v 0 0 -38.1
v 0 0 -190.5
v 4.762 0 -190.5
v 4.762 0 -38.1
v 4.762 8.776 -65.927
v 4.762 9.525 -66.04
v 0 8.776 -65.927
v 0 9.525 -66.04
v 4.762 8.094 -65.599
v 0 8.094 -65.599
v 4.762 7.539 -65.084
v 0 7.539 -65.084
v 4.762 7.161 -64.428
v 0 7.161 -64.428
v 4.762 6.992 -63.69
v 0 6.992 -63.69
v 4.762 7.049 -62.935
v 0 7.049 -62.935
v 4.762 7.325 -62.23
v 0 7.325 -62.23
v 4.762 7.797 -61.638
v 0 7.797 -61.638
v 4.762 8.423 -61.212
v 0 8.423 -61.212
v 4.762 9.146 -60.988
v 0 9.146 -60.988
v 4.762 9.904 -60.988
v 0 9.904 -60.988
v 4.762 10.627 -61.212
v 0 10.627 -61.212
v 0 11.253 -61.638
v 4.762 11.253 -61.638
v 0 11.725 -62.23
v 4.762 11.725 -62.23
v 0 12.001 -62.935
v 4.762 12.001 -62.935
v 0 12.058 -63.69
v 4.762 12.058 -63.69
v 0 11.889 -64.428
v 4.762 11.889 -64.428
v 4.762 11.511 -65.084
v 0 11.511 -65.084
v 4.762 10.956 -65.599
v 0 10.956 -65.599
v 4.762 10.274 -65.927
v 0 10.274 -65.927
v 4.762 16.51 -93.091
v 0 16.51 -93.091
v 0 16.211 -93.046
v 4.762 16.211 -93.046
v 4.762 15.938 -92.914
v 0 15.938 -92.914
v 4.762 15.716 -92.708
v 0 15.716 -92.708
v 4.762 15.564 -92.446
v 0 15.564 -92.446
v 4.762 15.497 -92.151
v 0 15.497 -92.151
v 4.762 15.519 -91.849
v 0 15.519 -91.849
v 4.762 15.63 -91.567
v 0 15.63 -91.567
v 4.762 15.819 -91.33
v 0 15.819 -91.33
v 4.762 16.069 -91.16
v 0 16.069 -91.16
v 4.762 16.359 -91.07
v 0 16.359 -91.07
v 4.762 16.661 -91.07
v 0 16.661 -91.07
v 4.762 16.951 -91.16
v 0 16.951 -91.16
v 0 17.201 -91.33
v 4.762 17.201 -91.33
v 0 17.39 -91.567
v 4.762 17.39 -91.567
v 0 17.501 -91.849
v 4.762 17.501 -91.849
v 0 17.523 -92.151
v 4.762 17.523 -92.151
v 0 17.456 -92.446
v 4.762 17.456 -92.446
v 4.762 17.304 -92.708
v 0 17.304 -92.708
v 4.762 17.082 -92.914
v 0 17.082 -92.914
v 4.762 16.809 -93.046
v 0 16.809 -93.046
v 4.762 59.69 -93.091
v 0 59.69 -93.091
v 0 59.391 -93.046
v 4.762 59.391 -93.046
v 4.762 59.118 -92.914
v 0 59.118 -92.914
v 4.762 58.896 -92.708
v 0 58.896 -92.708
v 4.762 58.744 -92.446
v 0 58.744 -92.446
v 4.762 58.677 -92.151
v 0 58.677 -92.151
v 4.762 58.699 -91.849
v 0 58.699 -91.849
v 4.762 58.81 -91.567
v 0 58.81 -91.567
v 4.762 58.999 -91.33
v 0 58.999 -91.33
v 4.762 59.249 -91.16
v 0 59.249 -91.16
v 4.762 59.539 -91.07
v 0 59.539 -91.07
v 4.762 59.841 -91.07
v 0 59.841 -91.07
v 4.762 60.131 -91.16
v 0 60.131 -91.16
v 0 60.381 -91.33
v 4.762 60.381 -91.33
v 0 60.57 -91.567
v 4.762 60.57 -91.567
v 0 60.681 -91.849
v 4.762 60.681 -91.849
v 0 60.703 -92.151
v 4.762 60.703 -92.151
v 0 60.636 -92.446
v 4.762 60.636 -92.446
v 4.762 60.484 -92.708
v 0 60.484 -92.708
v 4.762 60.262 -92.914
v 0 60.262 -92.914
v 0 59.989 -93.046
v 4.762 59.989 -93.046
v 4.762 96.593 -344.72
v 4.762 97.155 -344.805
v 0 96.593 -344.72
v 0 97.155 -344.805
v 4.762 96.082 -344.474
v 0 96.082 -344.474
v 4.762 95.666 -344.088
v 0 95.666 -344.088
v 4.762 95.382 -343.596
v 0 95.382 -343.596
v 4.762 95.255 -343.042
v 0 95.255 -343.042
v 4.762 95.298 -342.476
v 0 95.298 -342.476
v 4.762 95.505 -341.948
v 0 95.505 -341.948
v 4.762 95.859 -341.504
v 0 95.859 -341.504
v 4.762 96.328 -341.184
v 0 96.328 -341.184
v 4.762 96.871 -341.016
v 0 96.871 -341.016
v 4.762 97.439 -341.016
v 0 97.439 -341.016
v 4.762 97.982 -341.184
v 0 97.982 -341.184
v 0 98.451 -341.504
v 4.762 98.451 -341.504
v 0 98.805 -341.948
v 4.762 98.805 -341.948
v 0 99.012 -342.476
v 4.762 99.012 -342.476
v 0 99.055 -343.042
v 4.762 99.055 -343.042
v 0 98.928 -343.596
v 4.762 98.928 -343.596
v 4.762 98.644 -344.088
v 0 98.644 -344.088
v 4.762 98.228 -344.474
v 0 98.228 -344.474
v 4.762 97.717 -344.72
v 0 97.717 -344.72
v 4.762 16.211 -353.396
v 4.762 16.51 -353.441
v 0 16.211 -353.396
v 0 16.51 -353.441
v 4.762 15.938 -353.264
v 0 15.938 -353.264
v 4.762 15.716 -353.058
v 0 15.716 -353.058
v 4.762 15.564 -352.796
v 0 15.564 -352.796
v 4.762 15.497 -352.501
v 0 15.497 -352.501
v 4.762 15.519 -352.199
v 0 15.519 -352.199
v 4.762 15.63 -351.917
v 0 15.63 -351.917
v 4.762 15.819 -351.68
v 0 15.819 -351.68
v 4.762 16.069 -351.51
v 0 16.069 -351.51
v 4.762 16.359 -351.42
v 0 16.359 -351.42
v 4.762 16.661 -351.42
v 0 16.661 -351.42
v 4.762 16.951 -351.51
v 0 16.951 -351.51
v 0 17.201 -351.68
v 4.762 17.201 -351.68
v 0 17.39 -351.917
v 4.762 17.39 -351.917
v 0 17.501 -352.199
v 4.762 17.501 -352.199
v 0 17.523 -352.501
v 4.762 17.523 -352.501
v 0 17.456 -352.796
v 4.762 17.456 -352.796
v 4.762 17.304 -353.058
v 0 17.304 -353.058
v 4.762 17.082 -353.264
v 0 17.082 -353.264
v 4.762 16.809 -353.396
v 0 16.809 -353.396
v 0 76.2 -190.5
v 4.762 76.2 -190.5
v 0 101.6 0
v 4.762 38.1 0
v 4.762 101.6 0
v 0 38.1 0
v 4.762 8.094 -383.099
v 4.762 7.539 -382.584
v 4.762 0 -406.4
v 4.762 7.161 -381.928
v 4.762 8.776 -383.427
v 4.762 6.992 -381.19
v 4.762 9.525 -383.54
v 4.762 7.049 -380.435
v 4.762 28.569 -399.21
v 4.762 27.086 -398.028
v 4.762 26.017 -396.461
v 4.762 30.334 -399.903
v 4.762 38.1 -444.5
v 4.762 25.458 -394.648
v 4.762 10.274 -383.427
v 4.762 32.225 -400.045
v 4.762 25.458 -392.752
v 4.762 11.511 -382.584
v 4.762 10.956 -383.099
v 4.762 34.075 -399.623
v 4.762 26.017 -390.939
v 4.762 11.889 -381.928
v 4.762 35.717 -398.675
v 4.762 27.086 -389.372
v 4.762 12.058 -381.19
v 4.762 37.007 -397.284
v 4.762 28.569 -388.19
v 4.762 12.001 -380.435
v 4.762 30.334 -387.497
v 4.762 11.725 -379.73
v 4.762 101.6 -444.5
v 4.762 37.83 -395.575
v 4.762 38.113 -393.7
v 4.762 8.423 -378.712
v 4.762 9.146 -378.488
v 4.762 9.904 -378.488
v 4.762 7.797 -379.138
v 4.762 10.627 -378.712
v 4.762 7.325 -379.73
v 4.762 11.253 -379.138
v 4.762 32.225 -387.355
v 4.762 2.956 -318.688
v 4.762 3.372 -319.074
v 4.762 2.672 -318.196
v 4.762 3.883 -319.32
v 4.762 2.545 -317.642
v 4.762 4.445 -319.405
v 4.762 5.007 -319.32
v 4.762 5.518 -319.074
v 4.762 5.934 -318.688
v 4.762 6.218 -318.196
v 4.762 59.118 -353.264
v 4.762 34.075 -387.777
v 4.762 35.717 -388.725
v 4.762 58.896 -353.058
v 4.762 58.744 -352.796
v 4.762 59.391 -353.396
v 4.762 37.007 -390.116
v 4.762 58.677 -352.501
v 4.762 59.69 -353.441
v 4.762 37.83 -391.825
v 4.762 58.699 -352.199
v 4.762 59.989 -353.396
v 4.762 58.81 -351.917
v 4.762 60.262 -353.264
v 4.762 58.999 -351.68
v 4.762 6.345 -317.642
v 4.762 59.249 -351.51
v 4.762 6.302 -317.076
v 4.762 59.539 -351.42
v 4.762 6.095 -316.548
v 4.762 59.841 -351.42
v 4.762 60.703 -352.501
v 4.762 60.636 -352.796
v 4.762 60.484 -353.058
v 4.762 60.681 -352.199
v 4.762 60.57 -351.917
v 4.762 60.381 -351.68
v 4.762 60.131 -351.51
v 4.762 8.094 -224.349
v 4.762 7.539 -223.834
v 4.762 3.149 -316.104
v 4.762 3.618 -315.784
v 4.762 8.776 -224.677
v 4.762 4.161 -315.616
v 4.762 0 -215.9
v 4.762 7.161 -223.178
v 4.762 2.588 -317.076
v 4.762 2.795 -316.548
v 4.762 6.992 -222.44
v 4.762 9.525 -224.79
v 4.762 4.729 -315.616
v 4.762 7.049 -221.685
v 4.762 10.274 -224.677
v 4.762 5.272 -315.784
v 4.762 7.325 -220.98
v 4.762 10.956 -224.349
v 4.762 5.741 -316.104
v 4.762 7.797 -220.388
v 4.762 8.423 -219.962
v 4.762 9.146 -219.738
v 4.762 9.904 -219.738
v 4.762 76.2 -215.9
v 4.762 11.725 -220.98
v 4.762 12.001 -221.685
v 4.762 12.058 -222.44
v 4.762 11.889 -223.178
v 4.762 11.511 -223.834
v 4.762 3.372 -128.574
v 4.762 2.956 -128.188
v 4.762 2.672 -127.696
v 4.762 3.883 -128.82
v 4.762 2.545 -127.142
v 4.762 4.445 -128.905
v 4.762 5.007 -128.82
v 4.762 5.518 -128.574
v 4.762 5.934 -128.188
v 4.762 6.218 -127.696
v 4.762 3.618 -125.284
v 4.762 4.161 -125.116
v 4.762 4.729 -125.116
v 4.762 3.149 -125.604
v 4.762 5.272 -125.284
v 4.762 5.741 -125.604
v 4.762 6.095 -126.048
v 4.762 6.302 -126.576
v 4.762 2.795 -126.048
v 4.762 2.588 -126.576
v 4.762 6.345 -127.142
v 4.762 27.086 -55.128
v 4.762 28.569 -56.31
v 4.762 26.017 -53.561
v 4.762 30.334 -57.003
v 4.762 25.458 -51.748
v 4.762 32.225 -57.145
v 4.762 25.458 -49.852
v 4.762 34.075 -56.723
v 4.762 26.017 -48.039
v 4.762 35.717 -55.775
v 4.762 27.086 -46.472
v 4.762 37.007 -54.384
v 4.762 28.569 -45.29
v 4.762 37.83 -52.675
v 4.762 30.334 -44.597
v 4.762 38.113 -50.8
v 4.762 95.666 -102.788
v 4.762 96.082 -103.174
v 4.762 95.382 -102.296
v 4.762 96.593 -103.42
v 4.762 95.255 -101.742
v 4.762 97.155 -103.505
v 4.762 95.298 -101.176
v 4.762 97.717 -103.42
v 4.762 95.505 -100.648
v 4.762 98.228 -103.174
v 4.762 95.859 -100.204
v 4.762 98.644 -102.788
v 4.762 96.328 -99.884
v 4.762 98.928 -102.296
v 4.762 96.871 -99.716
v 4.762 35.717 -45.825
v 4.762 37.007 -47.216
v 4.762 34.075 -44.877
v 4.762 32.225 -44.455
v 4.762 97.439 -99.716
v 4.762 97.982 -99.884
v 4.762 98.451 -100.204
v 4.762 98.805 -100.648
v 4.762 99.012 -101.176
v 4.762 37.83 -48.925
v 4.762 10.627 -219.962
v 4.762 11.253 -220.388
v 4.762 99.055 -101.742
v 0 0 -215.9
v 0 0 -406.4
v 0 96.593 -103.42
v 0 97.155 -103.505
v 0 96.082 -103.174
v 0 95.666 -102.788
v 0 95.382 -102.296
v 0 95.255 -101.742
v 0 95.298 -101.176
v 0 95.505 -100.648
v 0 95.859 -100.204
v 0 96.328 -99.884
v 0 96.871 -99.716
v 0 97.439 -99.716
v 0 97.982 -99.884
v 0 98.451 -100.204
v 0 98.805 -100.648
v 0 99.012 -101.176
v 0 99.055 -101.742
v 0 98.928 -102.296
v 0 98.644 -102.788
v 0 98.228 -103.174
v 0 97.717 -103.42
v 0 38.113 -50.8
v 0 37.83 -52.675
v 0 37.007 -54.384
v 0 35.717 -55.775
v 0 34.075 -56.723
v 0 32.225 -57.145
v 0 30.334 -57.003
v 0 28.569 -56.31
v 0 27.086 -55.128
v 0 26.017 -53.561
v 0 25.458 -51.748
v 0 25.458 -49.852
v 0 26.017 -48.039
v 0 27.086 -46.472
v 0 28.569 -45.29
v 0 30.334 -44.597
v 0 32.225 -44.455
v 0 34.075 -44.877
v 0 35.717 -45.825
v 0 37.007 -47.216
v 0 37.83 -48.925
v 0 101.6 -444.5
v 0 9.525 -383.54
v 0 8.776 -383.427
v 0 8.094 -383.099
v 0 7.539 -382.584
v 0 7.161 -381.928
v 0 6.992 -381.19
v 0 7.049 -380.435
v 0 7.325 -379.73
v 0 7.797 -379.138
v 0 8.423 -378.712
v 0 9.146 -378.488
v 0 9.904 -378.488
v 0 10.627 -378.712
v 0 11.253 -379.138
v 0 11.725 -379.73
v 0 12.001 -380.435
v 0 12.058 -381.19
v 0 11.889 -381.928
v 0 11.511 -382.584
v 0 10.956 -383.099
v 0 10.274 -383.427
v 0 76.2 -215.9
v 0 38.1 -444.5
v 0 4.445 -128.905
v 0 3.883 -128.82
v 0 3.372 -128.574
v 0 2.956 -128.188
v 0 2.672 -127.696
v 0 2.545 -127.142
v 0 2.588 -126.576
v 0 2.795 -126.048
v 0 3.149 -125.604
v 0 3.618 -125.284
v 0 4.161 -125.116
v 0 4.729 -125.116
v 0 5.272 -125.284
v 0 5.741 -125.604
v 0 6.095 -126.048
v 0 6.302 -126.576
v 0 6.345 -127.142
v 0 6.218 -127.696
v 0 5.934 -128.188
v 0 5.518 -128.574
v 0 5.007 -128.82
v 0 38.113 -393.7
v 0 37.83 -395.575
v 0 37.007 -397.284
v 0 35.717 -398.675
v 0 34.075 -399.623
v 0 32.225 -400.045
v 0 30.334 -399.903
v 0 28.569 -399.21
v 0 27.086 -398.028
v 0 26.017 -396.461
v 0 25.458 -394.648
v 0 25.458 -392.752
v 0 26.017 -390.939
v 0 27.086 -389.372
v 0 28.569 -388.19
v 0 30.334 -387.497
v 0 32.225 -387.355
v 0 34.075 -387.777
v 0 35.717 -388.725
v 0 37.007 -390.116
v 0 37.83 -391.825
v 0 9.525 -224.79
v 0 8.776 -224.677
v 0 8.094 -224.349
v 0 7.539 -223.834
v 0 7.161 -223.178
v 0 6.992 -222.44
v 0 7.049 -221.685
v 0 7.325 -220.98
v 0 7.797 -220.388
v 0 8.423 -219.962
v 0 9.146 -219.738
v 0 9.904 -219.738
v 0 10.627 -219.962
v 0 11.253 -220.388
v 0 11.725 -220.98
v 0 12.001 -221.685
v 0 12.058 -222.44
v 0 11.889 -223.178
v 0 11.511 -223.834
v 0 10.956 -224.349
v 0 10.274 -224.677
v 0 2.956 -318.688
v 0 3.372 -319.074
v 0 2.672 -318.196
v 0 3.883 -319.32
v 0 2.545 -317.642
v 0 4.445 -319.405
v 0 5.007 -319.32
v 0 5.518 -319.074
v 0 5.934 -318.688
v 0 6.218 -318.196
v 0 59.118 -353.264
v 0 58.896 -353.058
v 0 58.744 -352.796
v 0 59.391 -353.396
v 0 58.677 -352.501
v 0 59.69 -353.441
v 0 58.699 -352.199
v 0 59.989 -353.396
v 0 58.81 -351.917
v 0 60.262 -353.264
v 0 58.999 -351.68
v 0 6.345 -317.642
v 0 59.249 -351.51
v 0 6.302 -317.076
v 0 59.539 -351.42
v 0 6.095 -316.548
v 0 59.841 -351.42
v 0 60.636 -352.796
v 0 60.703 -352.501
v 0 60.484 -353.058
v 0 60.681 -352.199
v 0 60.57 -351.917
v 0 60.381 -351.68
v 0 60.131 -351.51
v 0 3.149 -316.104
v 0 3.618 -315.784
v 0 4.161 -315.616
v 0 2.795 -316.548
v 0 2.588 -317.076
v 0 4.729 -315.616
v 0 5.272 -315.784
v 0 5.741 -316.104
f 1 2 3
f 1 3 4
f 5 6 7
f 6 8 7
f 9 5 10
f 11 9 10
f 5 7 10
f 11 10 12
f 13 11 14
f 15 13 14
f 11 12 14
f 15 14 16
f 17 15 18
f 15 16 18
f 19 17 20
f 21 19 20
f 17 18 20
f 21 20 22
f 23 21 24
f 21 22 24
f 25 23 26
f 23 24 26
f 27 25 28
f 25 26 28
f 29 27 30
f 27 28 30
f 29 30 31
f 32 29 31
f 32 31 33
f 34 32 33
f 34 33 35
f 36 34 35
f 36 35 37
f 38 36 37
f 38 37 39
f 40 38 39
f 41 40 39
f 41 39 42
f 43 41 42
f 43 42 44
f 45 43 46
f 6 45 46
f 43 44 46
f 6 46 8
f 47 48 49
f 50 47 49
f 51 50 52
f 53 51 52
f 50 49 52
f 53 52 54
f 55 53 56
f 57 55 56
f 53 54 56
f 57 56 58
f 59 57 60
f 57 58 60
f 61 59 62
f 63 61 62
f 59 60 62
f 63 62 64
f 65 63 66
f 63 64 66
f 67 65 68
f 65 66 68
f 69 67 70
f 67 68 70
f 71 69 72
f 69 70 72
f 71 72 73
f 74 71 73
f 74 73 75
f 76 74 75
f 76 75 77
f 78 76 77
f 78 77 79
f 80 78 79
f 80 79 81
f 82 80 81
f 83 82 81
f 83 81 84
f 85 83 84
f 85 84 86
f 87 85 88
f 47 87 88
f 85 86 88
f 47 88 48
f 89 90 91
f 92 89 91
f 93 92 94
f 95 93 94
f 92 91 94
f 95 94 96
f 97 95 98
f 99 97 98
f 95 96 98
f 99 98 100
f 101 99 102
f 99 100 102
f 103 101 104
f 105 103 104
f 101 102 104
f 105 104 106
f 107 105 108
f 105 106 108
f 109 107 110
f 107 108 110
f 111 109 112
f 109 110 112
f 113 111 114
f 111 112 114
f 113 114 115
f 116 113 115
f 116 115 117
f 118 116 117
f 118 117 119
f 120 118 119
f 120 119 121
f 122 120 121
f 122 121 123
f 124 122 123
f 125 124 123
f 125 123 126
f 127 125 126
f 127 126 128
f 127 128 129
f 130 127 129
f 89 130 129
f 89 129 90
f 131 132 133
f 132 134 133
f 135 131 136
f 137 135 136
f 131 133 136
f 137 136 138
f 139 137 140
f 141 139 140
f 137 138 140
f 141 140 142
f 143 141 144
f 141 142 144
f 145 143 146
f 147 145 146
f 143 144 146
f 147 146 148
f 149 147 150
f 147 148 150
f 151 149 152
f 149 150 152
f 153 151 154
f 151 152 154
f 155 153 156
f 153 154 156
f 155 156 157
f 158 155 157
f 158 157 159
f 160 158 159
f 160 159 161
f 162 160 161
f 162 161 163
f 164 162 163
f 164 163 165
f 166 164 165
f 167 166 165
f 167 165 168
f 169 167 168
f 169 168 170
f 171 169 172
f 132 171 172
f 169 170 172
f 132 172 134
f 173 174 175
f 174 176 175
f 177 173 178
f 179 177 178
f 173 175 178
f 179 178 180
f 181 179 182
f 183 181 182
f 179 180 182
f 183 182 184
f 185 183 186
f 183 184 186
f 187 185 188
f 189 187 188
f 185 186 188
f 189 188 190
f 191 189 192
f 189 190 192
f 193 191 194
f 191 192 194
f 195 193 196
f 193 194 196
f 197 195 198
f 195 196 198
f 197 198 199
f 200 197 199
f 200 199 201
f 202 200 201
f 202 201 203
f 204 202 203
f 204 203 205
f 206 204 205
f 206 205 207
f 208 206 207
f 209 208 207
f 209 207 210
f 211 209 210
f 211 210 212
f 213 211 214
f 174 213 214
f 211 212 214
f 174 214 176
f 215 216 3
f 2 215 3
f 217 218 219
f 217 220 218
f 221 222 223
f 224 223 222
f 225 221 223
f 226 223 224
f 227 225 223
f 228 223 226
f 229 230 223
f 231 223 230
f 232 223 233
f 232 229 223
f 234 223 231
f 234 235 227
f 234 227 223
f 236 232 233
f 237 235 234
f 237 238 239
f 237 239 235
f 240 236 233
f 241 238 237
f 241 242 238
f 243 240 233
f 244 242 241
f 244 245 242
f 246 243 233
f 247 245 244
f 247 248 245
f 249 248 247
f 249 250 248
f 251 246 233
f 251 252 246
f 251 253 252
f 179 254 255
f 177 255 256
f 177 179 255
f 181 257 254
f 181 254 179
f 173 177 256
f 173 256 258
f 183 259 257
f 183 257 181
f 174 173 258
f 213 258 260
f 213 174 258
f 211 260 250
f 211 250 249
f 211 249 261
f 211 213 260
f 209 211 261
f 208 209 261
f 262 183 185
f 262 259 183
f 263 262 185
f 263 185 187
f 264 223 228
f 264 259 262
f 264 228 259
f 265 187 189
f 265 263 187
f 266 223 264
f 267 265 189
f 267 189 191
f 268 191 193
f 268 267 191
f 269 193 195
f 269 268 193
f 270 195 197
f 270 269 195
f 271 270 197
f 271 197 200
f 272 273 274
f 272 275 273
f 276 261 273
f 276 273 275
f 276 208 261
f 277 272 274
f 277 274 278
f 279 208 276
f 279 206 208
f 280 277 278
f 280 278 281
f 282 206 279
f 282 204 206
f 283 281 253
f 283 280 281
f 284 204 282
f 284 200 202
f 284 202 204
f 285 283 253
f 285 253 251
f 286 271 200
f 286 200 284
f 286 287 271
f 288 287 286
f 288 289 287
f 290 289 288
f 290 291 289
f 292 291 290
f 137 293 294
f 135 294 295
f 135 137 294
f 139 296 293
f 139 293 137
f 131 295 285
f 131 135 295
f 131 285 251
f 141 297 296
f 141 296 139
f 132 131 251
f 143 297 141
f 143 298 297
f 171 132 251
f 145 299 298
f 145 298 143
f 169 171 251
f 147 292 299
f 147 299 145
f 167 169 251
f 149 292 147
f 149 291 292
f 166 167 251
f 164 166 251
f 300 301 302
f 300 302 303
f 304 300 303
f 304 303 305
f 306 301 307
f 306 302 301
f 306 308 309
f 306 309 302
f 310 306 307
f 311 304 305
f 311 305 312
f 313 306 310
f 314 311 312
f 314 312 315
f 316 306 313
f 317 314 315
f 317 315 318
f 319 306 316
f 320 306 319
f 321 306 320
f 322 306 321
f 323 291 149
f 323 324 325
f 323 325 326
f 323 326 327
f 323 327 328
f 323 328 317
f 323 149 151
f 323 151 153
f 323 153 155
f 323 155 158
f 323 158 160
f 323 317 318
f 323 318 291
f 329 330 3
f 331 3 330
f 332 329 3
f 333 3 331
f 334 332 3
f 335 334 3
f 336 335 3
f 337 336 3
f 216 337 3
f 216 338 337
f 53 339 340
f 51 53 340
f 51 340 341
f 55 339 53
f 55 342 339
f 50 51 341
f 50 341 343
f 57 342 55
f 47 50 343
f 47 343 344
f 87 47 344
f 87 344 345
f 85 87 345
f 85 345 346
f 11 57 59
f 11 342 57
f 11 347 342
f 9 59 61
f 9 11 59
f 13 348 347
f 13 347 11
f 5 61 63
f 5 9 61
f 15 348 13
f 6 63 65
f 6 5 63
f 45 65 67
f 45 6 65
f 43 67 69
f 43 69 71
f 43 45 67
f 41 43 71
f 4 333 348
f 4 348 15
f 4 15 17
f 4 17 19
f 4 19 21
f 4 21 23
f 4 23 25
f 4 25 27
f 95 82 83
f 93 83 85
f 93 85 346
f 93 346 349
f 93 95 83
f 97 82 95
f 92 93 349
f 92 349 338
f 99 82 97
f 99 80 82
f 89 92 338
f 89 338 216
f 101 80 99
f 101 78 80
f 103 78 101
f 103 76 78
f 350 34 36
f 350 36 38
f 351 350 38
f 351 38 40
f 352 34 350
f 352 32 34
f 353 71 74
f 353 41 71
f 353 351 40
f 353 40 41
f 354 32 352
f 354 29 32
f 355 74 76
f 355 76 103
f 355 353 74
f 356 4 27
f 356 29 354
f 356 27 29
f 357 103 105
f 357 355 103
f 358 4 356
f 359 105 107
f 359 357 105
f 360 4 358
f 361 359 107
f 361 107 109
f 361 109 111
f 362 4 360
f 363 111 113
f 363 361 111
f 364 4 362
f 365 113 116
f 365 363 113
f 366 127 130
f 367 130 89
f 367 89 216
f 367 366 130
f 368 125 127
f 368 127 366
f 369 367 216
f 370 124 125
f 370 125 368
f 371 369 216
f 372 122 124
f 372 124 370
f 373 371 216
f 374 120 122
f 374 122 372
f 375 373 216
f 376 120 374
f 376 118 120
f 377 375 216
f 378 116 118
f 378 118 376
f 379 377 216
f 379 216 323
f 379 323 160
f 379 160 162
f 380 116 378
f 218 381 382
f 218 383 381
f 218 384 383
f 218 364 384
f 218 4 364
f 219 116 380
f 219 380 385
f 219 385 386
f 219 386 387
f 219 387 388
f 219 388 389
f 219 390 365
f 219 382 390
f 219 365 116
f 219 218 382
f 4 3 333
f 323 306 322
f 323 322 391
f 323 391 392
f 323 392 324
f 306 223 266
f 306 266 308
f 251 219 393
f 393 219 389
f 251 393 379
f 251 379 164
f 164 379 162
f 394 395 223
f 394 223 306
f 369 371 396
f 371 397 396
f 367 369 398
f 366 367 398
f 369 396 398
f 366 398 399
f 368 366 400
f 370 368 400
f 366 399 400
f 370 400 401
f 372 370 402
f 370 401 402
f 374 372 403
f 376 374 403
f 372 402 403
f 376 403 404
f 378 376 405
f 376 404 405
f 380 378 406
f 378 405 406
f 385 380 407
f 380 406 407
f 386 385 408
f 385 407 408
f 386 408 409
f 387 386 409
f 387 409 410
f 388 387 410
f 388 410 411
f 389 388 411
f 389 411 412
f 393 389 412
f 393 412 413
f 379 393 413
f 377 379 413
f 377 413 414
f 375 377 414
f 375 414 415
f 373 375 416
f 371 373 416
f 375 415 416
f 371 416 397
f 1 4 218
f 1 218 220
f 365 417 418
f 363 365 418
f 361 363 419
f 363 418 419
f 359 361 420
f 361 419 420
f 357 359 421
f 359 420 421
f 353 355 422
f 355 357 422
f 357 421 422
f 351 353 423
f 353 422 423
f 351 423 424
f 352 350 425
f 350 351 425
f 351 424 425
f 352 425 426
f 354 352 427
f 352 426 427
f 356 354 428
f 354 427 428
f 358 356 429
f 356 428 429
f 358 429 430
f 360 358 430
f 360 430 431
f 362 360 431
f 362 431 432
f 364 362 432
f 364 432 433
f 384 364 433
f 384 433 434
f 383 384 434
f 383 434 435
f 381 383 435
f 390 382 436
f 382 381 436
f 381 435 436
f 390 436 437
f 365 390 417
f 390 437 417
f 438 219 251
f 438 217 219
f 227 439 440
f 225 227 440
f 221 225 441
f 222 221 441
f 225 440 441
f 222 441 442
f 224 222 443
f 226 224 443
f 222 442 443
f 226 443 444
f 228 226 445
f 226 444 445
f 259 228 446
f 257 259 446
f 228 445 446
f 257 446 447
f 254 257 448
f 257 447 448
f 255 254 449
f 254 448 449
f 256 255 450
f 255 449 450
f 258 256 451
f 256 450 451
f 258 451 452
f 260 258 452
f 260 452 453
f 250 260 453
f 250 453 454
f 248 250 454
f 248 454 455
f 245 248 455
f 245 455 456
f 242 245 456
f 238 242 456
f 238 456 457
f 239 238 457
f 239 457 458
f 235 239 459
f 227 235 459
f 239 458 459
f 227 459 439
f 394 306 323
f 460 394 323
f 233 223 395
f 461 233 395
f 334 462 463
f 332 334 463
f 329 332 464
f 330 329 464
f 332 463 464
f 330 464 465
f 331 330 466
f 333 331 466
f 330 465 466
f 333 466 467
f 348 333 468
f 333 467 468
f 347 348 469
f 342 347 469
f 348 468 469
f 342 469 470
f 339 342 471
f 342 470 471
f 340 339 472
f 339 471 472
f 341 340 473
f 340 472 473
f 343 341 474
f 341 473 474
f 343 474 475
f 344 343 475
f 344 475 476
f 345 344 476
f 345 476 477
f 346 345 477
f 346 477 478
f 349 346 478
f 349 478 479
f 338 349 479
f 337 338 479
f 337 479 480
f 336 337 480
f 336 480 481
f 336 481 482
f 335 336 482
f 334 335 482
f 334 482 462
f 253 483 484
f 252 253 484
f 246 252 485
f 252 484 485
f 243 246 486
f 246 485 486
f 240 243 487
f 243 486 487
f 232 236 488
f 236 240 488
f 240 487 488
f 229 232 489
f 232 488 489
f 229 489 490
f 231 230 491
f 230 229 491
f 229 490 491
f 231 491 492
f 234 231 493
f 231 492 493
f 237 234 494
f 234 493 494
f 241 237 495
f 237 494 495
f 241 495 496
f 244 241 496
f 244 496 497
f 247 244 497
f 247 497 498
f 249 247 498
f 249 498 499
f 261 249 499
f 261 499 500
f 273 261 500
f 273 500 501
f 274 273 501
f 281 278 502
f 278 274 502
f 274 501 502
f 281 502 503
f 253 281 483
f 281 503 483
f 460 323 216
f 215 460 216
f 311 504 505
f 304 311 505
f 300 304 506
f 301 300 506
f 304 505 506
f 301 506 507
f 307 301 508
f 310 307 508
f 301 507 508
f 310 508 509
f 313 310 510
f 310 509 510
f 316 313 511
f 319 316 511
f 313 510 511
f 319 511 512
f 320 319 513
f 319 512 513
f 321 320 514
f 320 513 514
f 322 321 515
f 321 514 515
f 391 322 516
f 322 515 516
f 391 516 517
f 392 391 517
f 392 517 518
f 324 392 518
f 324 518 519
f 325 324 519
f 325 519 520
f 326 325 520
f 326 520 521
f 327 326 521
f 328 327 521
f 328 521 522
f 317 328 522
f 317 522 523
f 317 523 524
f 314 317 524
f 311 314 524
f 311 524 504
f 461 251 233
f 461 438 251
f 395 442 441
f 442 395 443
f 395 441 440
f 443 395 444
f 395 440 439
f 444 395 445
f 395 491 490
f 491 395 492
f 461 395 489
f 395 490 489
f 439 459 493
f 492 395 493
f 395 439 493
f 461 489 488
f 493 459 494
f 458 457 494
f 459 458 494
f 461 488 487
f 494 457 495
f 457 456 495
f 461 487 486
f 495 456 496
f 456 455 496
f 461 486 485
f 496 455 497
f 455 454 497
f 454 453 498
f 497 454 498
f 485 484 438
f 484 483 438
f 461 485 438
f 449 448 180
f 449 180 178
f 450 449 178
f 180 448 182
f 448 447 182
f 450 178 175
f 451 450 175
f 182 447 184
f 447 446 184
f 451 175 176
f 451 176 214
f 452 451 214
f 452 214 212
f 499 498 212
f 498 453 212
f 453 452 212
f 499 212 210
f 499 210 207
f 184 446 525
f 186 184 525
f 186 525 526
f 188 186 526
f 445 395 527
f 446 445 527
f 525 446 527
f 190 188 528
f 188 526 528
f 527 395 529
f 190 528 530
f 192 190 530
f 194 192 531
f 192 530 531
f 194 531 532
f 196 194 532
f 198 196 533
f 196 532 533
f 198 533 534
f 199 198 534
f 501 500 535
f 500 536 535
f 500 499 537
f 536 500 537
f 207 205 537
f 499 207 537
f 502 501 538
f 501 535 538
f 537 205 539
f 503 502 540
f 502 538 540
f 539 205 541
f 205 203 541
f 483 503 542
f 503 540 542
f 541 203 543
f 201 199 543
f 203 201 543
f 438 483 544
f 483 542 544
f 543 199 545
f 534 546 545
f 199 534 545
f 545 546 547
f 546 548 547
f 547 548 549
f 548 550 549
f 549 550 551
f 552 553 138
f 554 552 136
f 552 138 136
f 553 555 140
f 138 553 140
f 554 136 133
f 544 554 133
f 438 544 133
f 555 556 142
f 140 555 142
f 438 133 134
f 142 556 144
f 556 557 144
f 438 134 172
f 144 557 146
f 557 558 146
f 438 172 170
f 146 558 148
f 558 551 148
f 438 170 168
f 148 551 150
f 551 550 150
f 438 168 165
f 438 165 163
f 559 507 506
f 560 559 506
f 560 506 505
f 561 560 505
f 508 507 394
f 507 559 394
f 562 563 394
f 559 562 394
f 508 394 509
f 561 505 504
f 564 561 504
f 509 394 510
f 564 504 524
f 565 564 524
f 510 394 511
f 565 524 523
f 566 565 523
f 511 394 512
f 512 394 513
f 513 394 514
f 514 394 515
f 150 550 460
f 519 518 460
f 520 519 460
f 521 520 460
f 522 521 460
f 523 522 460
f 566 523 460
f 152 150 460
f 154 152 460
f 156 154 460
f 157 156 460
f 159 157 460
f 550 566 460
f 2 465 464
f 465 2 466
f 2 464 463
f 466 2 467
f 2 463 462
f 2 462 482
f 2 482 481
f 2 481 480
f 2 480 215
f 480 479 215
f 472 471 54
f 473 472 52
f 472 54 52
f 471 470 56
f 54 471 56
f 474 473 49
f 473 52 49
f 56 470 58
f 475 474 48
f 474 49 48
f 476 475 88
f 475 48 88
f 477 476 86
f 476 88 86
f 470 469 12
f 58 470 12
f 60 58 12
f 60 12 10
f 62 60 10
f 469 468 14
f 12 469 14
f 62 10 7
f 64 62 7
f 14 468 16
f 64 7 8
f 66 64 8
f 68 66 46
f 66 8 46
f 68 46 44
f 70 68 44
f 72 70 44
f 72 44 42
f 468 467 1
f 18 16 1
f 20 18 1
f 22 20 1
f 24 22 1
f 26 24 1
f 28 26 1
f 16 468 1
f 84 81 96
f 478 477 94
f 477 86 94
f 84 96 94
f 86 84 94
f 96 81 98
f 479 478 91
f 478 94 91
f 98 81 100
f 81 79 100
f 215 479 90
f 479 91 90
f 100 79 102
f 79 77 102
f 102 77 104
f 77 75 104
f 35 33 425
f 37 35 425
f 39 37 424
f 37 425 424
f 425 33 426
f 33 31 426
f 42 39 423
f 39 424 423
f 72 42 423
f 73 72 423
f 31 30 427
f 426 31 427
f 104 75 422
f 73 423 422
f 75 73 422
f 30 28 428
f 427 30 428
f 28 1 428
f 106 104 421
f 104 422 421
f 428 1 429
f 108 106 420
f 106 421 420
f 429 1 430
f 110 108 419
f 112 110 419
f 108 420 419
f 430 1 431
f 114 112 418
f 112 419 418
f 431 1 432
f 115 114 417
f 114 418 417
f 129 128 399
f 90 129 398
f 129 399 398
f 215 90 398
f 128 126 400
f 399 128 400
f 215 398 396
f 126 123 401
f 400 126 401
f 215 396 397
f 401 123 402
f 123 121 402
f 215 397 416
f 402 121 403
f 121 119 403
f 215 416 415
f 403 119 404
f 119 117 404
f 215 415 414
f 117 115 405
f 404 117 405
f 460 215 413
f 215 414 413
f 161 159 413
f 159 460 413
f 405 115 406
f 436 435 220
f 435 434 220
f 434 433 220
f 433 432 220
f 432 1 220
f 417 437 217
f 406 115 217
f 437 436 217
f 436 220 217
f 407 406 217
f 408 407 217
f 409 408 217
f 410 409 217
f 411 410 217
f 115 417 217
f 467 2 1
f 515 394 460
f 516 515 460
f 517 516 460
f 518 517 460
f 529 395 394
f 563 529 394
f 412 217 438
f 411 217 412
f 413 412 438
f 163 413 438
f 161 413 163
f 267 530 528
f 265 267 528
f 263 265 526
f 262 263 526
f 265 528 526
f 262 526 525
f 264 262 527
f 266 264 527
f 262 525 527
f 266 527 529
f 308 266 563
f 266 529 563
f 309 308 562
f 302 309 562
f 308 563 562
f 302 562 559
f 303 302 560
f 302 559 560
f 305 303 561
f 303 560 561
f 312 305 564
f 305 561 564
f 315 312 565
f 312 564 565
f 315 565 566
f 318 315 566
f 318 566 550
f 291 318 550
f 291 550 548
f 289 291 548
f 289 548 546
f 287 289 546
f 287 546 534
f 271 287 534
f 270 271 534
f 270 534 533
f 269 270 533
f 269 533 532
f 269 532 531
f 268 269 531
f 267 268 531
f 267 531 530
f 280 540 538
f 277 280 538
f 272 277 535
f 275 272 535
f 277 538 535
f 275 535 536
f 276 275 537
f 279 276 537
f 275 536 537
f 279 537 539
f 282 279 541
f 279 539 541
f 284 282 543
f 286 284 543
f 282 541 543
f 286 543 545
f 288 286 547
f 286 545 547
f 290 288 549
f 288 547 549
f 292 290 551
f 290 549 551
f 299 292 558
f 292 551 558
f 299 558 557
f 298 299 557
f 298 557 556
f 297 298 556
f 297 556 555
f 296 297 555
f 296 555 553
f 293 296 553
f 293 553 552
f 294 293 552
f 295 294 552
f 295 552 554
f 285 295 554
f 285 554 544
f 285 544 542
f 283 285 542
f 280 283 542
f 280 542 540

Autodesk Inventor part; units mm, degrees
ref_plane "YZ Plane" through (0, 0, 0) normal (1, 0, 0) x (0, 1, 0)
ref_plane "XZ Plane" through (0, 0, 0) normal (0, 1, 0) x (-1, 0, 0)
ref_plane "XY Plane" through (0, 0, 0) normal (0, 0, 1) x (1, 0, 0)
sketch "Sketch1" plane through (0, 0, 0) normal (1, 0, 0) x (0, 1, 0)
  line L0 (0, 0) -> (101.6, 0)
  line L1 (101.6, 0) -> (101.6, -444.5)
  line L2 (101.6, -444.5) -> (0, -444.5)
  line L3 (0, -444.5) -> (0, 0)
  circle A0 centre (31.75, -50.8) radius 6.3627
  circle A1 centre (31.75, -393.7) radius 6.3627
  circle A2 centre (86.2838, -165.5318) radius 1.5875
  circle A3 centre (70.2818, -165.5318) radius 1.5875
  circle A4 centre (15.3162, -278.9682) radius 1.5875
  circle A5 centre (31.3182, -278.9682) radius 1.5875
  dimension "d0" = 101.6
  dimension "d1" = 444.5
  dimension "d2" = 12.7254
  dimension "d3" = 31.75
  dimension "d4" = 50.8
  dimension "d5" = 50.8
  dimension "d22" = 165.5318
  dimension "d23" = 3.175
  dimension "d24" = 15.3162
  dimension "d25" = 3.175
  dimension "d26" = 16.002
  dimension "d27" = 165.5318
  dimension "d28" = 3.175
  dimension "d29" = 15.3162
  dimension "d30" = 165.5318
  dimension "d31" = 3.175
  dimension "d32" = 16.002
  dimension "d33" = 165.5318
extrude "Extrusion1" add sketch "Sketch1" along normal blind 4.7625 contours L0 L1 L2 L3 | A2 | A3 | A4 | A5
chamfer "Chamfer1" distance 38.1 angle 45 1 edges at (2.3813, 0, 0)
chamfer "Chamfer2" distance 38.1 angle 45 1 edges at (2.3813, 0, -444.5)
sketch "Sketch6" plane through (4.7625, 0, 0) normal (1, 0, 0) x (0, 0, -1)
  line L0 (444.5, 38.1) -> (406.4, 0) projected
  line L1 (444.5, 38.1) -> (444.5, 101.6) projected
  line L2 (444.5, 101.6) -> (0, 101.6) projected
  line L3 (0, 101.6) -> (0, 38.1) projected
  line L4 (38.1, 0) -> (0, 38.1) projected
  line L5 (38.1, 0) -> (406.4, 0) projected
  circle A0 centre (393.7, 31.75) radius 6.3627 projected
  circle A1 centre (50.8, 31.75) radius 6.3627 projected
  point P0 (0, 0)
  point P1 (92.075, 59.69)
  point P2 (92.075, 16.51)
  point P3 (352.425, 59.69)
  point P4 (352.425, 16.51)
  dimension "d80" = 43.18
  dimension "d83" = 16.51
  dimension "d86" = 43.18
  dimension "d115" = 92.075
  dimension "d116" = 92.075
  dimension "d117" = 16.51
  dimension "d118" = 92.075
  dimension "d119" = 92.075
hole "Hole1" at (4.7625, 59.69, -92.075) at (4.7625, 16.51, -92.075) at (4.7625, 59.69, -352.425) at (4.7625, 16.51, -352.425) direction (-1, 0, 0) diameter 2.032 end through all
sketch "Sketch7" plane through (4.7625, 0, 0) normal (1, 0, 0) x (0, 0, -1)
  circle A0 centre (352.425, 59.69) radius 1.016 projected
  circle A1 centre (92.075, 59.69) radius 1.016 projected
  circle A2 centre (92.075, 16.51) radius 1.016 projected
  circle A3 centre (352.425, 16.51) radius 1.016 projected
  line L0 (444.5, 38.1) -> (406.4, 0) projected
  line L1 (444.5, 38.1) -> (444.5, 101.6) projected
  line L2 (444.5, 101.6) -> (0, 101.6) projected
  line L3 (0, 101.6) -> (0, 38.1) projected
  line L4 (38.1, 0) -> (0, 38.1) projected
  line L5 (38.1, 0) -> (406.4, 0) projected
  circle A4 centre (393.7, 31.75) radius 6.3627 projected
  circle A5 centre (50.8, 31.75) radius 6.3627 projected
  point P0 (0, 0)
  point P1 (101.6, 97.155)
  point P2 (342.9, 97.155)
  point P3 (127, 4.445)
  point P4 (317.5, 4.445)
  dimension "d95" = 4.445
  dimension "d96" = 4.445
  dimension "d97" = 4.445
  dimension "d98" = 4.445
  dimension "d99" = 101.6
  dimension "d100" = 101.6
  dimension "d101" = 127
  dimension "d102" = 127
hole "Hole2" at (4.7625, 97.155, -101.6) at (4.7625, 97.155, -342.9) at (4.7625, 4.445, -127) at (4.7625, 4.445, -317.5) direction (-1, 0, 0) diameter 3.81 depth 25.4 tip angle 118
sketch "Sketch8" plane through (4.7625, 0, 0) normal (1, 0, 0) x (0, 0, -1)
  line L0 (406.4, 0) -> (38.1, 0) projected
  line L1 (190.5, 0) -> (215.9, 0)
  line L2 (215.9, 0) -> (215.9, 76.2)
  line L3 (215.9, 76.2) -> (190.5, 76.2)
  line L4 (190.5, 76.2) -> (190.5, 0)
  line L5 (0, 101.6) -> (0, 38.1) projected
  point P0 (0, 0)
  dimension "d112" = 25.4
  dimension "d113" = 190.5
  dimension "d114" = 76.2
extrude "Extrusion6" cut sketch "Sketch8" against normal through all
sketch "Sketch9" plane through (4.7625, 0, 0) normal (1, 0, 0) x (0, 0, -1)
  line L0 (38.1, 0) -> (190.5, 0) projected
  line L1 (0, 101.6) -> (0, 38.1) projected
  line L2 (444.5, 38.1) -> (444.5, 101.6) projected
  point P0 (0, 0)
  point P1 (63.5, 9.525)
  point P2 (222.25, 9.525)
  point P3 (381, 9.525)
  dimension "d120" = 9.525
  dimension "d121" = 63.5
  dimension "d122" = 63.5
  dimension "d123" = 317.5
  dimension "d124" = 158.75
hole "Hole3" at (4.7625, 9.525, -63.5) at (4.7625, 9.525, -222.25) at (4.7625, 9.525, -381) direction (-1, 0, 0) diameter 5.08 depth 19.05 tip angle 118
equation "\"d86\" = d80"
equation "\"d116\" = d115"
equation "\"d117\" = d83"
equation "\"d118\" = d115"
equation "\"d119\" = d118"
equation "\"d96\" = d95"
equation "\"d97\" = d95"
equation "\"d98\" = d95"
equation "\"d100\" = d99"
equation "\"d124\" = 0.5 * d123"
properties part number "DriveTrain3.0" material "Aluminum 6061"
